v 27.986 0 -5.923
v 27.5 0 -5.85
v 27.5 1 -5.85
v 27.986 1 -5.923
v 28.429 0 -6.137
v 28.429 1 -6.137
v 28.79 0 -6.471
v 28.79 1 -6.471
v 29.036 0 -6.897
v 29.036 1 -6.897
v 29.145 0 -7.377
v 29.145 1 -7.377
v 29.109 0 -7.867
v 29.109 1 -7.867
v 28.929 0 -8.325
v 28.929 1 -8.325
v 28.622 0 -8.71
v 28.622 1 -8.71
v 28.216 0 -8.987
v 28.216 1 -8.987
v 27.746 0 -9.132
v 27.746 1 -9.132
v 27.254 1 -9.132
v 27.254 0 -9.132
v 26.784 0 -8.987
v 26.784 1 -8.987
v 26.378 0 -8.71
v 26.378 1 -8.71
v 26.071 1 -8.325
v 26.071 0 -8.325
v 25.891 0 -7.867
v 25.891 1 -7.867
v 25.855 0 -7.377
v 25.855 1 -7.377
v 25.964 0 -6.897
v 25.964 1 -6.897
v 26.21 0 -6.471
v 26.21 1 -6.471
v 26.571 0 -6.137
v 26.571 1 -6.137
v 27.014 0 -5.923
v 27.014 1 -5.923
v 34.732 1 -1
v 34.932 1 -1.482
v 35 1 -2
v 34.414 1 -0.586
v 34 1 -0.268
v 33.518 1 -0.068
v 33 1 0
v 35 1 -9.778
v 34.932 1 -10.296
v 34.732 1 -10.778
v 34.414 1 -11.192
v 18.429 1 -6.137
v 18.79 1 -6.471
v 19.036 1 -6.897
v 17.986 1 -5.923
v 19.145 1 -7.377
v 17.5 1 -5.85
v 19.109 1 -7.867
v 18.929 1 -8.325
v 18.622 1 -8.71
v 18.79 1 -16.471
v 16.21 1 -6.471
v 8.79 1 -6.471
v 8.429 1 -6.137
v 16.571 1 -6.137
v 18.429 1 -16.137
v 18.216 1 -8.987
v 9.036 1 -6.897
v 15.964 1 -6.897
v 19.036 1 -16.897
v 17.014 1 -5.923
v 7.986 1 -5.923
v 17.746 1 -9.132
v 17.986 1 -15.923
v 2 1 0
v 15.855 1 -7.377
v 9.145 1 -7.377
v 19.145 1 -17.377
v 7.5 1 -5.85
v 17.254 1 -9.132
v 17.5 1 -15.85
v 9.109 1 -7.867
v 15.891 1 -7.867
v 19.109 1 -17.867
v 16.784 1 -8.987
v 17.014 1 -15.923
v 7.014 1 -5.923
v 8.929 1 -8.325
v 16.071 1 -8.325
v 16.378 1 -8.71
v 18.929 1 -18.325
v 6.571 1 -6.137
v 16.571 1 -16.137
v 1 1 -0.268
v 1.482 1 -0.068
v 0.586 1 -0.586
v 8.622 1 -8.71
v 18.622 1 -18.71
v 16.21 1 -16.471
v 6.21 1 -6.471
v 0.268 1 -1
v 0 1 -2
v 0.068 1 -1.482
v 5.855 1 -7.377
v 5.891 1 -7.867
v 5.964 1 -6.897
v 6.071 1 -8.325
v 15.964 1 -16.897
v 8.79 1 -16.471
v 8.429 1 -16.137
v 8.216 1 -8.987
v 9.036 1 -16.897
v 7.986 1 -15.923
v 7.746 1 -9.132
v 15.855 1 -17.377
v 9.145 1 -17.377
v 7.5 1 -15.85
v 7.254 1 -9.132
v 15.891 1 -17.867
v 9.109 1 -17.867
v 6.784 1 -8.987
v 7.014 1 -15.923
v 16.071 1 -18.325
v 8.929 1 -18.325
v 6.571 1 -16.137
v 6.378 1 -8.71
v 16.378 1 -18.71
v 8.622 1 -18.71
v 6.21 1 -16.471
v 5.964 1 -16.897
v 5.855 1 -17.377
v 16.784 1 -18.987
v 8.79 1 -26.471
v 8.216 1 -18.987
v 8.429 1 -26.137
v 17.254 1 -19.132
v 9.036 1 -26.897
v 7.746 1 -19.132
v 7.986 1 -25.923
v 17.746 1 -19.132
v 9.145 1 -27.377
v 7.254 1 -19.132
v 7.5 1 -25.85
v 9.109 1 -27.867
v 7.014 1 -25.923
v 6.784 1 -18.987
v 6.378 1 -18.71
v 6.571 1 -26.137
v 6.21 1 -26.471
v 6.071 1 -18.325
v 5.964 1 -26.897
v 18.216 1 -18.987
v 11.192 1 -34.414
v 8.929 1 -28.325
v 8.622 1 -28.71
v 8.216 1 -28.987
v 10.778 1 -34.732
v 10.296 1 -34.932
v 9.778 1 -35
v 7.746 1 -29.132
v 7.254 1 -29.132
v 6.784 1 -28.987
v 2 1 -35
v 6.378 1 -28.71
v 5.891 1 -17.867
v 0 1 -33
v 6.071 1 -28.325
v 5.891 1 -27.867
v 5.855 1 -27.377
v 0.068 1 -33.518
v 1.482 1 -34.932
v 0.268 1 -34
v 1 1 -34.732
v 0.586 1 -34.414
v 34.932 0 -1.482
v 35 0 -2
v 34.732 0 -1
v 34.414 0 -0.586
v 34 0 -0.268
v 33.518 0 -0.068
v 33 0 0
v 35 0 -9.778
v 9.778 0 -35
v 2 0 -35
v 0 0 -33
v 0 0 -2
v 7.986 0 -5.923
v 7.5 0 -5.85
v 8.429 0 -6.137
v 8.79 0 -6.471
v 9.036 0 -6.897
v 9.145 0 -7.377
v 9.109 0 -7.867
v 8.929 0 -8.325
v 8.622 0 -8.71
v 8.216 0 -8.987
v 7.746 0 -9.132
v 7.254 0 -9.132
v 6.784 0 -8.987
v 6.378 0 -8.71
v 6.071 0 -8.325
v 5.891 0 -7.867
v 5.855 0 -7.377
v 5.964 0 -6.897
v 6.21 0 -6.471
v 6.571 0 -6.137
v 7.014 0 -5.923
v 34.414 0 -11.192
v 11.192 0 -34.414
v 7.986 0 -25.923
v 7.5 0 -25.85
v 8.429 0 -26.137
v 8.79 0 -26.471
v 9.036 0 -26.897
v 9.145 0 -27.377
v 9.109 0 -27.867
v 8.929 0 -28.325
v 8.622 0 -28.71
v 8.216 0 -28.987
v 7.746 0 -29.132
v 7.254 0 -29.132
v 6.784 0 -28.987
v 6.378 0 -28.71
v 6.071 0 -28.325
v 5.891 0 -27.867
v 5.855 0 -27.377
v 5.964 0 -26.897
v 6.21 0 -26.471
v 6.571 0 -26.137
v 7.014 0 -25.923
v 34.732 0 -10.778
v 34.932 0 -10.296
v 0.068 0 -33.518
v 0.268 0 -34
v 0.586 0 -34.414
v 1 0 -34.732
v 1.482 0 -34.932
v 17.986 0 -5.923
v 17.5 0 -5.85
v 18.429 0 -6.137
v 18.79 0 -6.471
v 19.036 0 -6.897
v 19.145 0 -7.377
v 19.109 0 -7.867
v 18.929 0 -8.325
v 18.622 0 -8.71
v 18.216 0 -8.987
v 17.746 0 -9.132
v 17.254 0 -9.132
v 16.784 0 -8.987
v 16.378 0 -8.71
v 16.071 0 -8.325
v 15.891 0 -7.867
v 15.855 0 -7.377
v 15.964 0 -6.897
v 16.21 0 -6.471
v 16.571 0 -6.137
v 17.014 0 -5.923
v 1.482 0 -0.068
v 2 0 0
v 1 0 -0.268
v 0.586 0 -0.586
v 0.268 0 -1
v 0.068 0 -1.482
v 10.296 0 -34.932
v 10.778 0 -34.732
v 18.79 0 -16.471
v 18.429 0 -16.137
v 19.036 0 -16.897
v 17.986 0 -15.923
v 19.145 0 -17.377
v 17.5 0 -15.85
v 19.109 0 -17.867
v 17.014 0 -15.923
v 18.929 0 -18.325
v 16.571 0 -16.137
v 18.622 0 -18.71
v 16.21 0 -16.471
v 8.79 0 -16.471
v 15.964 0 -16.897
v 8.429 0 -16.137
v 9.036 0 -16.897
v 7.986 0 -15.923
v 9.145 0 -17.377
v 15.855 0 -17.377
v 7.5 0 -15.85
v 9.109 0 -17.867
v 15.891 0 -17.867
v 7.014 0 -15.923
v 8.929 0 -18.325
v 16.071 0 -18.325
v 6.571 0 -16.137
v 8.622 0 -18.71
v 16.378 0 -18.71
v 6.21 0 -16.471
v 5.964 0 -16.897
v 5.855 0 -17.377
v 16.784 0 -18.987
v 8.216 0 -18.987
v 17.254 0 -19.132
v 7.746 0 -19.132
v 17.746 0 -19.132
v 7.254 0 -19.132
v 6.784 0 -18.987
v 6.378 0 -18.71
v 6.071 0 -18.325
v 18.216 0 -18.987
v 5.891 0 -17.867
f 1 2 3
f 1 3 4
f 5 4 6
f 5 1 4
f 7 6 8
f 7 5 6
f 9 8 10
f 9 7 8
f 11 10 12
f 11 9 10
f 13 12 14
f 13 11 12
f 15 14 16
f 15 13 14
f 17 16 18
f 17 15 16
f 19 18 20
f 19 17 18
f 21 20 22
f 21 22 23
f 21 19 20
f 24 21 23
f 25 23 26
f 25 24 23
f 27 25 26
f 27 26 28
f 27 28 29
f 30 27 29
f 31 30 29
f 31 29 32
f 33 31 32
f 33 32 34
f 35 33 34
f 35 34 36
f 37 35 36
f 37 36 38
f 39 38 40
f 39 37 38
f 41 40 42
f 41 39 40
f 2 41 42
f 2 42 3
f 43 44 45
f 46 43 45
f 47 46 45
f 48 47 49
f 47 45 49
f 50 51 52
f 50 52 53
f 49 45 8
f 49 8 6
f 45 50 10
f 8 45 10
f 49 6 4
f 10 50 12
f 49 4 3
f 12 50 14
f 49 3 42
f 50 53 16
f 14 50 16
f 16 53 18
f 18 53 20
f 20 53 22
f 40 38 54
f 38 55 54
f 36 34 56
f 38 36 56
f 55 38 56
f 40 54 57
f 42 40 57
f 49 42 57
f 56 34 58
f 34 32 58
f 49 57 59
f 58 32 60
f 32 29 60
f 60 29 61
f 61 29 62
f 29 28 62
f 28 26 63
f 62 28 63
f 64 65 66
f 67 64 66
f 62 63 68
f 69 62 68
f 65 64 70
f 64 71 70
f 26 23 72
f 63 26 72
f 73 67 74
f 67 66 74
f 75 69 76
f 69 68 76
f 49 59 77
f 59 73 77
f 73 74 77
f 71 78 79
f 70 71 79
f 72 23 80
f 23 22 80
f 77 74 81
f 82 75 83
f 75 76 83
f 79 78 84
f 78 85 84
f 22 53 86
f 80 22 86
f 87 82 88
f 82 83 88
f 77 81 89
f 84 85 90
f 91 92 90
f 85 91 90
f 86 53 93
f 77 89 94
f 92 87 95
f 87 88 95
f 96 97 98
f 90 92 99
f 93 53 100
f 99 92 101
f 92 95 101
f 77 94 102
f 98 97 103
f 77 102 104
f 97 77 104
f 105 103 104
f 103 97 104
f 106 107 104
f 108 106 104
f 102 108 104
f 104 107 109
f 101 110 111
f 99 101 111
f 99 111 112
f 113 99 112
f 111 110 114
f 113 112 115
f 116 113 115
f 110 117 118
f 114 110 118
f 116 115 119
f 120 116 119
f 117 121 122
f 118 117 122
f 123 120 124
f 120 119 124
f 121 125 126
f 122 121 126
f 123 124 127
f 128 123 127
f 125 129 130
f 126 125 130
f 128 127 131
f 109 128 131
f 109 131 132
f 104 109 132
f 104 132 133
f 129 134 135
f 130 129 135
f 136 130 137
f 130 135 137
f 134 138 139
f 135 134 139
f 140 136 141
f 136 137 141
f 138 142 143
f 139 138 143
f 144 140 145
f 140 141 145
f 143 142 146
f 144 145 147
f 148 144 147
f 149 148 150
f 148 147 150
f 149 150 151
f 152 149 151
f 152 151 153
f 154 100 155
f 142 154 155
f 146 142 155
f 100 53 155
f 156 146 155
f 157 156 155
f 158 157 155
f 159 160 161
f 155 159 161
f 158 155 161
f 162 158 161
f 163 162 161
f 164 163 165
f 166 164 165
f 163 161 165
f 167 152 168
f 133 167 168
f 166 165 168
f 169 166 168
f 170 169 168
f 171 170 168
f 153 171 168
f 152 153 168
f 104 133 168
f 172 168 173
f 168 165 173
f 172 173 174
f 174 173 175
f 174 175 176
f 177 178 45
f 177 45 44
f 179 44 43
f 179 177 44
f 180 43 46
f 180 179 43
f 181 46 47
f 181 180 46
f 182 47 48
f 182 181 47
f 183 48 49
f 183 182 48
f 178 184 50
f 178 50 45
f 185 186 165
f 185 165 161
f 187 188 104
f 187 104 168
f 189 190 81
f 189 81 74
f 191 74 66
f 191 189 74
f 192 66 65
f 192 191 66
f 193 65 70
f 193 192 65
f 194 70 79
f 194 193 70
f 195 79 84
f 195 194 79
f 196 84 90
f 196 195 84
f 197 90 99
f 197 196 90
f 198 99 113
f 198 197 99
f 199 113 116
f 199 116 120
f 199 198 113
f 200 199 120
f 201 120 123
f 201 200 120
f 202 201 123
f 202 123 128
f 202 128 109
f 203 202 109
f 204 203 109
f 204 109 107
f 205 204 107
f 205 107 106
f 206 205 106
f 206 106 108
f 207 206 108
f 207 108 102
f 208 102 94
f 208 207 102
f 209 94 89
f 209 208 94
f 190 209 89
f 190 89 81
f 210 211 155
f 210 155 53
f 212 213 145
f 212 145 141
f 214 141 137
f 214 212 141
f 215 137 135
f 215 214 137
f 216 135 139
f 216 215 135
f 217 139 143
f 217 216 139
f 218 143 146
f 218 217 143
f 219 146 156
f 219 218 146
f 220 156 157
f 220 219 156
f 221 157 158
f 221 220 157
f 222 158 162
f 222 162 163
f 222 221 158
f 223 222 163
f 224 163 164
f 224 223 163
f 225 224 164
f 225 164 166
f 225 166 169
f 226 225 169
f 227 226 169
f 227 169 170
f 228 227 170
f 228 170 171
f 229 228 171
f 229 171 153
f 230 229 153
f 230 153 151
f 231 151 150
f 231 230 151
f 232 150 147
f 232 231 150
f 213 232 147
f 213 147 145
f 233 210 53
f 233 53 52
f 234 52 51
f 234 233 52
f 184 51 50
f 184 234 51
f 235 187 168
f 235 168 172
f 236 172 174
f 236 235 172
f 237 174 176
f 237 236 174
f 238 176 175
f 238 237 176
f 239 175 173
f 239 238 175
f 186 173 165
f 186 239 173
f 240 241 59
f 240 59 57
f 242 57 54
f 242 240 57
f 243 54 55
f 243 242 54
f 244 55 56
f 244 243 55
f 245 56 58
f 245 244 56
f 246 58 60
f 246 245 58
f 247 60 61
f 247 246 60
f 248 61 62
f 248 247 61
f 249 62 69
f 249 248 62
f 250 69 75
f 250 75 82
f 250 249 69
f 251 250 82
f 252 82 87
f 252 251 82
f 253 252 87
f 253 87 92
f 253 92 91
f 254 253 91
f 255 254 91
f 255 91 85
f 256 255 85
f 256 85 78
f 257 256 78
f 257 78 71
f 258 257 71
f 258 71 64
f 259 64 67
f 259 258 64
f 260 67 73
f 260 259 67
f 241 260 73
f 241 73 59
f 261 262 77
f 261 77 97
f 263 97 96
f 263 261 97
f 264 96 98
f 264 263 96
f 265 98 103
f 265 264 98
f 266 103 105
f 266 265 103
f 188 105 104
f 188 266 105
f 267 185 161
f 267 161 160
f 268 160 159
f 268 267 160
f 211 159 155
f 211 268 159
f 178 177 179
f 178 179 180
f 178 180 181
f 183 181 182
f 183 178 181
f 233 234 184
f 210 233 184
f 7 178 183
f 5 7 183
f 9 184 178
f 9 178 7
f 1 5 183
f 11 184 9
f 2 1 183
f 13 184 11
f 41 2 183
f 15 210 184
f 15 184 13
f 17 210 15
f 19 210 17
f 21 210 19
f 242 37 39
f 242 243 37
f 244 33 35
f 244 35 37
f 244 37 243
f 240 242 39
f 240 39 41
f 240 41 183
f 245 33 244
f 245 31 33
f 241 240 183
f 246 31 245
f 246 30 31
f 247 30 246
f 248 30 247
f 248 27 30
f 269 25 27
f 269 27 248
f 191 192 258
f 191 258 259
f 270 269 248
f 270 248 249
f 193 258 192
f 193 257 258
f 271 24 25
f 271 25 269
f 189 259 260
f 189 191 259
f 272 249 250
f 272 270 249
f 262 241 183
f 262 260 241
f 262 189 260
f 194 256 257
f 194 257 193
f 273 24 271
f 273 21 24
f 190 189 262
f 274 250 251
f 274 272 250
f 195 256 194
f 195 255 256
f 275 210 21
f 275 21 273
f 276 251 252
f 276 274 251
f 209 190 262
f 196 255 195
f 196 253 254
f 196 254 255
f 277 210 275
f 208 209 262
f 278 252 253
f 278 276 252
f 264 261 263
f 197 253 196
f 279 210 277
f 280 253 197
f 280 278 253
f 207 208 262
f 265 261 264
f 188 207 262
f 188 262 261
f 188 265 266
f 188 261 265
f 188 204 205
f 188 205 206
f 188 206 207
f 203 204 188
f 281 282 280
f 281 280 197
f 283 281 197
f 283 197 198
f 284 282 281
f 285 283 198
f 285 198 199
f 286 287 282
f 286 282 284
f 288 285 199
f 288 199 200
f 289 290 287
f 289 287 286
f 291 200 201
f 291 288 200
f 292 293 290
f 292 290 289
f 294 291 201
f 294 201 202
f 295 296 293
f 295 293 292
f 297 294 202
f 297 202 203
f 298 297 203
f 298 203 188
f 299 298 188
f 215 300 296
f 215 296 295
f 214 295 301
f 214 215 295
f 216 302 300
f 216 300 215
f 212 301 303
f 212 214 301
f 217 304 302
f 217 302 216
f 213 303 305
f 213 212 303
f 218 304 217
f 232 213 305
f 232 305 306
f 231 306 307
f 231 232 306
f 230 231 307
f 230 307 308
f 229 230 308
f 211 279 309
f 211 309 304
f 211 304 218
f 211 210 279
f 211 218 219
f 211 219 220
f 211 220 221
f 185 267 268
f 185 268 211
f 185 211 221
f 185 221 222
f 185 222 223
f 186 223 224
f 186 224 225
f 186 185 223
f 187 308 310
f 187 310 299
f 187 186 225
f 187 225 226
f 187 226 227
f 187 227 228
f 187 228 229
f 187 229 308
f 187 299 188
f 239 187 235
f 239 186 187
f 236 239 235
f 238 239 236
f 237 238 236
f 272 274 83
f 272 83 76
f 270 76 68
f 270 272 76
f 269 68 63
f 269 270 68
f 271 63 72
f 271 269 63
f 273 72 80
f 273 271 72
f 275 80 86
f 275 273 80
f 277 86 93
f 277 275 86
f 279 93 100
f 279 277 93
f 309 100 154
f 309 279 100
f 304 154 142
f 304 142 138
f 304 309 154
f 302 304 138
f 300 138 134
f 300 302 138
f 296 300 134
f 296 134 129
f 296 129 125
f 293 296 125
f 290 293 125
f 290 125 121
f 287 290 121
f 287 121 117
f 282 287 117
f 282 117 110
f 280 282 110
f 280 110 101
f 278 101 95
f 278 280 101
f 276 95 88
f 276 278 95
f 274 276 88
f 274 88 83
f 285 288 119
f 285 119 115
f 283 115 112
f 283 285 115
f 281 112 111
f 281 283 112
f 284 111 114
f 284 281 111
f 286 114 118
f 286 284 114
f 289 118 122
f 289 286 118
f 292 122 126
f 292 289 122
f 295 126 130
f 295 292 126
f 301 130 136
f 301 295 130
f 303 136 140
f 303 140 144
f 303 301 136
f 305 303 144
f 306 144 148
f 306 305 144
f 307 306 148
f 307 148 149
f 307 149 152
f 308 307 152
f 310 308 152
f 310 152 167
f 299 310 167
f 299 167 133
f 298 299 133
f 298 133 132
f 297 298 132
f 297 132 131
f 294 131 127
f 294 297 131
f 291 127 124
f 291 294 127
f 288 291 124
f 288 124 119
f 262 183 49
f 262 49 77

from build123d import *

# Parameters (mm, degrees)
SKETCH1_R           = 1.65
BOSS_EXTRUDE1_DEPTH = 1


with BuildPart() as part:
    # Sketch1 → Boss-Extrude1 (new body)
    with BuildSketch(Plane(origin=(0, 0, 0), x_dir=(1, 0, 0), z_dir=(0, 1, 0))):
        with BuildLine():
            Line((0, 2), (0, 33))
            ThreePointArc((0, 33), (0.585786438, 34.414213562), (2, 35))
            Line((2, 35), (9.778174593, 35))
            ThreePointArc((9.778174593, 35), (10.543541458, 34.847759065), (11.192388155, 34.414213562))
            Line((11.192388155, 34.414213562), (34.414213562, 11.192388155))
            ThreePointArc((34.414213562, 11.192388155), (34.847759065, 10.543541458), (35, 9.778174593))
            Line((35, 9.778174593), (35, 2))
            ThreePointArc((35, 2), (34.414213562, 0.585786438), (33, 0))
            Line((33, 0), (2, 0))
            ThreePointArc((2, 0), (0.585786438, 0.585786438), (0, 2))
        make_face()
        with Locations(Location((7.5, 7.5, 0), (0, 0, 270))):
            Circle(SKETCH1_R, mode=Mode.SUBTRACT)
        with Locations(Location((7.5, 27.5, 0), (0, 0, 270))):
            Circle(SKETCH1_R, mode=Mode.SUBTRACT)
        with Locations(Location((17.5, 7.5, 0), (0, 0, 270))):
            Circle(SKETCH1_R, mode=Mode.SUBTRACT)
        with Locations(Location((27.5, 7.5, 0), (0, 0, 270))):
            Circle(SKETCH1_R, mode=Mode.SUBTRACT)
        with Locations(Location((7.5, 17.5, 0), (0, 0, 270))):
            Circle(SKETCH1_R, mode=Mode.SUBTRACT)
        with Locations(Location((17.5, 17.5, 0), (0, 0, 270))):
            Circle(SKETCH1_R, mode=Mode.SUBTRACT)
    extrude(amount=BOSS_EXTRUDE1_DEPTH)


solid = part.part
